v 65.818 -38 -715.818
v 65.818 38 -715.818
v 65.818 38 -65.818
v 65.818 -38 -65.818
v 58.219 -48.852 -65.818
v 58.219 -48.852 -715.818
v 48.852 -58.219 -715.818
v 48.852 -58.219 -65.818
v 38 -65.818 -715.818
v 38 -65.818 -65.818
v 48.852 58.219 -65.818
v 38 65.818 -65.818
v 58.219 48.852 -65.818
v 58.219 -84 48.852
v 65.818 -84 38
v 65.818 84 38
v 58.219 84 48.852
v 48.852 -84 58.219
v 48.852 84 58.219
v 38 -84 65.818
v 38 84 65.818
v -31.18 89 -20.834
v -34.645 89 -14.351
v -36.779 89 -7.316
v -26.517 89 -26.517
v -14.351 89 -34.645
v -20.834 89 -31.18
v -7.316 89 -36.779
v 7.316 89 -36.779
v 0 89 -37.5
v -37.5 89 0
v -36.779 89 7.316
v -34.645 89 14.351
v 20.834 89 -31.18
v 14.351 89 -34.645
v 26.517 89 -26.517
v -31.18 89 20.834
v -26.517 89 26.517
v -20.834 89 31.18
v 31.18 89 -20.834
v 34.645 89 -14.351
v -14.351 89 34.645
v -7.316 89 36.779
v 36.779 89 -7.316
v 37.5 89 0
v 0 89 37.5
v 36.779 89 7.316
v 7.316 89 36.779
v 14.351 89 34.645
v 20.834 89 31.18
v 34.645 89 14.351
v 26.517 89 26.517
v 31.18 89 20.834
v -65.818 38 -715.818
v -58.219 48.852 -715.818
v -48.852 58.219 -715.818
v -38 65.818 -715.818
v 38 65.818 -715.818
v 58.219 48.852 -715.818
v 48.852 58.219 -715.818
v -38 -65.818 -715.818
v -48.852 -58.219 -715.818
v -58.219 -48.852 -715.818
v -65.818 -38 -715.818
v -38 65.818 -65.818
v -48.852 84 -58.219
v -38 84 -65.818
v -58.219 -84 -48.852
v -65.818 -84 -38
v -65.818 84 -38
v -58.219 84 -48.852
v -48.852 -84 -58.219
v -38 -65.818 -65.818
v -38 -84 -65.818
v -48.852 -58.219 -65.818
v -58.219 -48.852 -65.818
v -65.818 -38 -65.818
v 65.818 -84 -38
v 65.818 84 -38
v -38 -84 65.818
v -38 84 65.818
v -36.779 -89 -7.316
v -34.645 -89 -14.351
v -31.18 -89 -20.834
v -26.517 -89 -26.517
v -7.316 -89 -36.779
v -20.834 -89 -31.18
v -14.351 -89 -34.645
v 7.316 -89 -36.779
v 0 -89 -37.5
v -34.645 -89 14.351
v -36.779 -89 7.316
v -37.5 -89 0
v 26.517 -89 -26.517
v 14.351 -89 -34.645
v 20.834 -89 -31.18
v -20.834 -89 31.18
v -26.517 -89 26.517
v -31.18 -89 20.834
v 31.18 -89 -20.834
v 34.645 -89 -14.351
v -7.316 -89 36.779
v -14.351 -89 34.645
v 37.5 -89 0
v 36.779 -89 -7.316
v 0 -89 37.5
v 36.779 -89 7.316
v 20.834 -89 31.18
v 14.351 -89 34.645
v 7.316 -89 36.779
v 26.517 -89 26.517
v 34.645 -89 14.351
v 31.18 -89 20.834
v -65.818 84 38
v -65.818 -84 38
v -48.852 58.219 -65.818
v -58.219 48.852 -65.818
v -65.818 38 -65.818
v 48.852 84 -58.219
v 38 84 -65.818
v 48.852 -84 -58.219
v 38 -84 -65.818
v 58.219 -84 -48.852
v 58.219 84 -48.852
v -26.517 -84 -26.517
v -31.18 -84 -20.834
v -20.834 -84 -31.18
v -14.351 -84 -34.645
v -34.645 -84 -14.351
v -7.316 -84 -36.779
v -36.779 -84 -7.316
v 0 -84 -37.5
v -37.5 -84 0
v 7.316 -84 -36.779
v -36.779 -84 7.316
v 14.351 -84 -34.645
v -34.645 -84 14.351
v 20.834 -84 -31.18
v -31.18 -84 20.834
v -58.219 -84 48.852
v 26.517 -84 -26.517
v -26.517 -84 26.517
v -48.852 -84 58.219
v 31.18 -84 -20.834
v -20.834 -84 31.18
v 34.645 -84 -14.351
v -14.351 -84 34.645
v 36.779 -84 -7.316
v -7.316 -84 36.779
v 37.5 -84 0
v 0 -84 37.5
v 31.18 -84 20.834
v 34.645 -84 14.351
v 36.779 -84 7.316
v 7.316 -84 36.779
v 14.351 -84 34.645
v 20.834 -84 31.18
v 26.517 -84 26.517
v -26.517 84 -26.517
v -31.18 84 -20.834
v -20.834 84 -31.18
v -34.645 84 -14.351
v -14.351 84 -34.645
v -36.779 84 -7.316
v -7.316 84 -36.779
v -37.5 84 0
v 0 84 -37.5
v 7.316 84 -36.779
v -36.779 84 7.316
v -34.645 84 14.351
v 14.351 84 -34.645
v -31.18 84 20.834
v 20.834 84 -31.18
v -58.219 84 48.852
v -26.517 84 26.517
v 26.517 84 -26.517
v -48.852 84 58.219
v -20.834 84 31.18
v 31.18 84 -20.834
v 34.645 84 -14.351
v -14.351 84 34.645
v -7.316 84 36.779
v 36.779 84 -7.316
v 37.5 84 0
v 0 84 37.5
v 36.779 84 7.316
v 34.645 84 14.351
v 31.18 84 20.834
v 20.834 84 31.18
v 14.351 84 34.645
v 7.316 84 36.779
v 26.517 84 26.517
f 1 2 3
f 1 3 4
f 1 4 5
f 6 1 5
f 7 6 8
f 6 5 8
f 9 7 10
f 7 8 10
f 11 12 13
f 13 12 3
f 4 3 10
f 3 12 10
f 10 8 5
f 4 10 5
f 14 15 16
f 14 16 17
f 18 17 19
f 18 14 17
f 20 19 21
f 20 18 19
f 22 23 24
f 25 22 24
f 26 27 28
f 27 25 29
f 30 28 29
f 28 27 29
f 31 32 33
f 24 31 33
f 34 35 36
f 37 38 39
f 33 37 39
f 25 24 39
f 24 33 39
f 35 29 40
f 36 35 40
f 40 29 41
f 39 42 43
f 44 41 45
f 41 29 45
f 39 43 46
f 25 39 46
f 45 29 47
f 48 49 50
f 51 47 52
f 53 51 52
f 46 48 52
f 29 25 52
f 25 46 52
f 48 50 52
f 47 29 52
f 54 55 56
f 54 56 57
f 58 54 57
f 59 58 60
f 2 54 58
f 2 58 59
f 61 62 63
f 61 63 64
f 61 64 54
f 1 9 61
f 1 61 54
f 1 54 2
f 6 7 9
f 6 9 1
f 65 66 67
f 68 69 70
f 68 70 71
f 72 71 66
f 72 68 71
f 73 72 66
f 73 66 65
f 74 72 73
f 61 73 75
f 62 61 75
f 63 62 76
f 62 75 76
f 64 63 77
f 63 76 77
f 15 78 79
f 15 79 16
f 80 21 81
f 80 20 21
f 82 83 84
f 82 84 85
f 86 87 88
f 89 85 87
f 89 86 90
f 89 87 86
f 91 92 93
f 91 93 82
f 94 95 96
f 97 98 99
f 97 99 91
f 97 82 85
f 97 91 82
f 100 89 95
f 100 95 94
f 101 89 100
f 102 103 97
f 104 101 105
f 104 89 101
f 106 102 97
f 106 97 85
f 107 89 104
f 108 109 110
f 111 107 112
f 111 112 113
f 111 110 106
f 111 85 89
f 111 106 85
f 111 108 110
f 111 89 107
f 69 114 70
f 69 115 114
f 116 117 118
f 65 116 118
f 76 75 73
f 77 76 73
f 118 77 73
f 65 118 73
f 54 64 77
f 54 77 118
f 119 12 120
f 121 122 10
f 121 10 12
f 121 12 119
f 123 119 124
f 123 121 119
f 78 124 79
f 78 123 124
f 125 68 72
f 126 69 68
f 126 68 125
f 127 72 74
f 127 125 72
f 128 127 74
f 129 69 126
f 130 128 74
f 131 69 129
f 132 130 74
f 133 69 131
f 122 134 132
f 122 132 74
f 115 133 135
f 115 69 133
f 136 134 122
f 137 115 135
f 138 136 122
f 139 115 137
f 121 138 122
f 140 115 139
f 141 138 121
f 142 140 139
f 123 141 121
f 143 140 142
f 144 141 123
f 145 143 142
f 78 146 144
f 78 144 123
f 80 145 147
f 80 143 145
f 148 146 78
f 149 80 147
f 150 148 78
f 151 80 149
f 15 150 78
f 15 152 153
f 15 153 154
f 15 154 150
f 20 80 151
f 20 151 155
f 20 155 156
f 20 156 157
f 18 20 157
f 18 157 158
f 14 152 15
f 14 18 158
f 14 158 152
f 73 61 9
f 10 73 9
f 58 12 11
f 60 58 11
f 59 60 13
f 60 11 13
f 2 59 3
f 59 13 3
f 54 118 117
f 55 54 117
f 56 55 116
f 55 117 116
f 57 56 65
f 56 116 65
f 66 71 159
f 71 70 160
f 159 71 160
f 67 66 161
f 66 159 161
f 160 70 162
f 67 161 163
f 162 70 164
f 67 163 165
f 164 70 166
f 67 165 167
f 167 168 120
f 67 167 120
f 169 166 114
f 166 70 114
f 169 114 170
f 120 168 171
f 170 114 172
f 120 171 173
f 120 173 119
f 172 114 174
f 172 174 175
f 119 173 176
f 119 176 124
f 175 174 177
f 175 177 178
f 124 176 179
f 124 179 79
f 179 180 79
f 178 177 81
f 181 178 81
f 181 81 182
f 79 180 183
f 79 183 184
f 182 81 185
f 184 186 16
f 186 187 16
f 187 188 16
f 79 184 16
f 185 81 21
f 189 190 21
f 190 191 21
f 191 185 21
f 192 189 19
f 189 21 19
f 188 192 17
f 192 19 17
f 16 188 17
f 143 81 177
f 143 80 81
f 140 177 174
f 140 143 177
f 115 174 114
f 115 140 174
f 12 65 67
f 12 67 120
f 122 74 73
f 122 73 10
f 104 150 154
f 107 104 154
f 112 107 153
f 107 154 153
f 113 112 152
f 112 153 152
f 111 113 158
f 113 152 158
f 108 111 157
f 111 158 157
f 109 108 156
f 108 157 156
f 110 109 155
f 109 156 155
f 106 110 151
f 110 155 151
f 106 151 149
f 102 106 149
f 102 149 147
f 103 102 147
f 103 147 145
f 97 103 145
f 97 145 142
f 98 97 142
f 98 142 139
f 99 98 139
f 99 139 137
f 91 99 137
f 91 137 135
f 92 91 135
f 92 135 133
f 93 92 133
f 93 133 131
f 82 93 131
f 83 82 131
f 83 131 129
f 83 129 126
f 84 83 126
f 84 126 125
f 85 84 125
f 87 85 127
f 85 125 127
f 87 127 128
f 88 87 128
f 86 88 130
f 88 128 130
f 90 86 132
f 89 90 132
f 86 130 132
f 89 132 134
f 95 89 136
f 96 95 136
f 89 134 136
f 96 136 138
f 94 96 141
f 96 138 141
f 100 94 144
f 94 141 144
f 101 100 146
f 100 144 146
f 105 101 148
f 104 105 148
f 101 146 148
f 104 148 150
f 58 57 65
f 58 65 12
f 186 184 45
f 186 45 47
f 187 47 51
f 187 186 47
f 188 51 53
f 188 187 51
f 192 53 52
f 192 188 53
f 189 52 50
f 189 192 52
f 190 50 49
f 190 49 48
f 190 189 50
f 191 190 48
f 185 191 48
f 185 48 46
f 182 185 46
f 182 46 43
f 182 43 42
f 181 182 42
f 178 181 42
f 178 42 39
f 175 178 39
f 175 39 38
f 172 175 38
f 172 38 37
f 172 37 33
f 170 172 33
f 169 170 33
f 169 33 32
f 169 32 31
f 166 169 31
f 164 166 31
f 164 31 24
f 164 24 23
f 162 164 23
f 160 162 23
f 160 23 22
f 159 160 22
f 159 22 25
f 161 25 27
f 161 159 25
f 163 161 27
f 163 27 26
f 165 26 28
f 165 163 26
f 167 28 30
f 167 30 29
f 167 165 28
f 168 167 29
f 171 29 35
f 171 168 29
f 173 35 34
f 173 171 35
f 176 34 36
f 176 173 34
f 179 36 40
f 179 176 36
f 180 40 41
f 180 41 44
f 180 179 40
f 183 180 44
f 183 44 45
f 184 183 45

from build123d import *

# Parameters (mm, degrees)
F0_R          = 37.5
F1_DEPTH      = 84
F1_DEPTH_BACK = 84
F2_DEPTH      = 89
F2_DEPTH_BACK = 89
F3_W          = 76
F3_H          = 131.6358613752
F3_R          = 37.5
F4_DEPTH      = 650


with BuildPart() as f1:
    # F0 (on Front) → F1 (new body, two sides)
    with BuildSketch(Plane.XZ) as f1_sk:
        with BuildLine():
            Line((-65.8179306876, 38), (-65.8179306876, -38))
            ThreePointArc((-65.8179306876, -38), (-53.7401153702, -53.7401153702), (-38, -65.8179306876))
            Line((-38, -65.8179306876), (38, -65.8179306876))
            ThreePointArc((38, -65.8179306876), (53.7401153702, -53.7401153702), (65.8179306876, -38))
            Line((65.8179306876, -38), (65.8179306876, 38))
            ThreePointArc((65.8179306876, 38), (53.7401153702, 53.7401153702), (38, 65.8179306876))
            Line((38, 65.8179306876), (-38, 65.8179306876))
            ThreePointArc((-38, 65.8179306876), (-53.7401153702, 53.7401153702), (-65.8179306876, 38))
        make_face()
        Circle(F0_R, mode=Mode.SUBTRACT)
        Circle(F0_R)
    extrude(amount=F1_DEPTH)
    extrude(f1_sk.sketch, amount=-F1_DEPTH_BACK)

    # F0 (on Front) → F2 (join, two sides)
    with BuildSketch(Plane.XZ) as f2_sk:
        Circle(F0_R)
    extrude(amount=F2_DEPTH)
    extrude(f2_sk.sketch, amount=-F2_DEPTH_BACK)

    # F3 (on face) → F4 (join)
    with BuildSketch(Plane(origin=(0, 0, -65.8179306876), x_dir=(1, 0, 0), z_dir=(0, 0, -1))):
        Rectangle(F3_W, F3_H)
        Circle(F3_R, mode=Mode.SUBTRACT)
        Circle(F3_R)
        with BuildLine():
            Line((-65.8179306876, 38), (-65.8179306876, -38))
            ThreePointArc((-65.8179306876, -38), (-53.7401153702, -53.7401153702), (-38, -65.8179306876))
            Line((-38, -65.8179306876), (-38, 65.8179306876))
            ThreePointArc((-38, 65.8179306876), (-53.7401153702, 53.7401153702), (-65.8179306876, 38))
        make_face()
        with BuildLine():
            Line((38, 65.8179306876), (38, -65.8179306876))
            ThreePointArc((38, -65.8179306876), (53.7401153702, -53.7401153702), (65.8179306876, -38))
            Line((65.8179306876, -38), (65.8179306876, 38))
            ThreePointArc((65.8179306876, 38), (53.7401153702, 53.7401153702), (38, 65.8179306876))
        make_face()
    extrude(amount=F4_DEPTH)


solid = f1.part
